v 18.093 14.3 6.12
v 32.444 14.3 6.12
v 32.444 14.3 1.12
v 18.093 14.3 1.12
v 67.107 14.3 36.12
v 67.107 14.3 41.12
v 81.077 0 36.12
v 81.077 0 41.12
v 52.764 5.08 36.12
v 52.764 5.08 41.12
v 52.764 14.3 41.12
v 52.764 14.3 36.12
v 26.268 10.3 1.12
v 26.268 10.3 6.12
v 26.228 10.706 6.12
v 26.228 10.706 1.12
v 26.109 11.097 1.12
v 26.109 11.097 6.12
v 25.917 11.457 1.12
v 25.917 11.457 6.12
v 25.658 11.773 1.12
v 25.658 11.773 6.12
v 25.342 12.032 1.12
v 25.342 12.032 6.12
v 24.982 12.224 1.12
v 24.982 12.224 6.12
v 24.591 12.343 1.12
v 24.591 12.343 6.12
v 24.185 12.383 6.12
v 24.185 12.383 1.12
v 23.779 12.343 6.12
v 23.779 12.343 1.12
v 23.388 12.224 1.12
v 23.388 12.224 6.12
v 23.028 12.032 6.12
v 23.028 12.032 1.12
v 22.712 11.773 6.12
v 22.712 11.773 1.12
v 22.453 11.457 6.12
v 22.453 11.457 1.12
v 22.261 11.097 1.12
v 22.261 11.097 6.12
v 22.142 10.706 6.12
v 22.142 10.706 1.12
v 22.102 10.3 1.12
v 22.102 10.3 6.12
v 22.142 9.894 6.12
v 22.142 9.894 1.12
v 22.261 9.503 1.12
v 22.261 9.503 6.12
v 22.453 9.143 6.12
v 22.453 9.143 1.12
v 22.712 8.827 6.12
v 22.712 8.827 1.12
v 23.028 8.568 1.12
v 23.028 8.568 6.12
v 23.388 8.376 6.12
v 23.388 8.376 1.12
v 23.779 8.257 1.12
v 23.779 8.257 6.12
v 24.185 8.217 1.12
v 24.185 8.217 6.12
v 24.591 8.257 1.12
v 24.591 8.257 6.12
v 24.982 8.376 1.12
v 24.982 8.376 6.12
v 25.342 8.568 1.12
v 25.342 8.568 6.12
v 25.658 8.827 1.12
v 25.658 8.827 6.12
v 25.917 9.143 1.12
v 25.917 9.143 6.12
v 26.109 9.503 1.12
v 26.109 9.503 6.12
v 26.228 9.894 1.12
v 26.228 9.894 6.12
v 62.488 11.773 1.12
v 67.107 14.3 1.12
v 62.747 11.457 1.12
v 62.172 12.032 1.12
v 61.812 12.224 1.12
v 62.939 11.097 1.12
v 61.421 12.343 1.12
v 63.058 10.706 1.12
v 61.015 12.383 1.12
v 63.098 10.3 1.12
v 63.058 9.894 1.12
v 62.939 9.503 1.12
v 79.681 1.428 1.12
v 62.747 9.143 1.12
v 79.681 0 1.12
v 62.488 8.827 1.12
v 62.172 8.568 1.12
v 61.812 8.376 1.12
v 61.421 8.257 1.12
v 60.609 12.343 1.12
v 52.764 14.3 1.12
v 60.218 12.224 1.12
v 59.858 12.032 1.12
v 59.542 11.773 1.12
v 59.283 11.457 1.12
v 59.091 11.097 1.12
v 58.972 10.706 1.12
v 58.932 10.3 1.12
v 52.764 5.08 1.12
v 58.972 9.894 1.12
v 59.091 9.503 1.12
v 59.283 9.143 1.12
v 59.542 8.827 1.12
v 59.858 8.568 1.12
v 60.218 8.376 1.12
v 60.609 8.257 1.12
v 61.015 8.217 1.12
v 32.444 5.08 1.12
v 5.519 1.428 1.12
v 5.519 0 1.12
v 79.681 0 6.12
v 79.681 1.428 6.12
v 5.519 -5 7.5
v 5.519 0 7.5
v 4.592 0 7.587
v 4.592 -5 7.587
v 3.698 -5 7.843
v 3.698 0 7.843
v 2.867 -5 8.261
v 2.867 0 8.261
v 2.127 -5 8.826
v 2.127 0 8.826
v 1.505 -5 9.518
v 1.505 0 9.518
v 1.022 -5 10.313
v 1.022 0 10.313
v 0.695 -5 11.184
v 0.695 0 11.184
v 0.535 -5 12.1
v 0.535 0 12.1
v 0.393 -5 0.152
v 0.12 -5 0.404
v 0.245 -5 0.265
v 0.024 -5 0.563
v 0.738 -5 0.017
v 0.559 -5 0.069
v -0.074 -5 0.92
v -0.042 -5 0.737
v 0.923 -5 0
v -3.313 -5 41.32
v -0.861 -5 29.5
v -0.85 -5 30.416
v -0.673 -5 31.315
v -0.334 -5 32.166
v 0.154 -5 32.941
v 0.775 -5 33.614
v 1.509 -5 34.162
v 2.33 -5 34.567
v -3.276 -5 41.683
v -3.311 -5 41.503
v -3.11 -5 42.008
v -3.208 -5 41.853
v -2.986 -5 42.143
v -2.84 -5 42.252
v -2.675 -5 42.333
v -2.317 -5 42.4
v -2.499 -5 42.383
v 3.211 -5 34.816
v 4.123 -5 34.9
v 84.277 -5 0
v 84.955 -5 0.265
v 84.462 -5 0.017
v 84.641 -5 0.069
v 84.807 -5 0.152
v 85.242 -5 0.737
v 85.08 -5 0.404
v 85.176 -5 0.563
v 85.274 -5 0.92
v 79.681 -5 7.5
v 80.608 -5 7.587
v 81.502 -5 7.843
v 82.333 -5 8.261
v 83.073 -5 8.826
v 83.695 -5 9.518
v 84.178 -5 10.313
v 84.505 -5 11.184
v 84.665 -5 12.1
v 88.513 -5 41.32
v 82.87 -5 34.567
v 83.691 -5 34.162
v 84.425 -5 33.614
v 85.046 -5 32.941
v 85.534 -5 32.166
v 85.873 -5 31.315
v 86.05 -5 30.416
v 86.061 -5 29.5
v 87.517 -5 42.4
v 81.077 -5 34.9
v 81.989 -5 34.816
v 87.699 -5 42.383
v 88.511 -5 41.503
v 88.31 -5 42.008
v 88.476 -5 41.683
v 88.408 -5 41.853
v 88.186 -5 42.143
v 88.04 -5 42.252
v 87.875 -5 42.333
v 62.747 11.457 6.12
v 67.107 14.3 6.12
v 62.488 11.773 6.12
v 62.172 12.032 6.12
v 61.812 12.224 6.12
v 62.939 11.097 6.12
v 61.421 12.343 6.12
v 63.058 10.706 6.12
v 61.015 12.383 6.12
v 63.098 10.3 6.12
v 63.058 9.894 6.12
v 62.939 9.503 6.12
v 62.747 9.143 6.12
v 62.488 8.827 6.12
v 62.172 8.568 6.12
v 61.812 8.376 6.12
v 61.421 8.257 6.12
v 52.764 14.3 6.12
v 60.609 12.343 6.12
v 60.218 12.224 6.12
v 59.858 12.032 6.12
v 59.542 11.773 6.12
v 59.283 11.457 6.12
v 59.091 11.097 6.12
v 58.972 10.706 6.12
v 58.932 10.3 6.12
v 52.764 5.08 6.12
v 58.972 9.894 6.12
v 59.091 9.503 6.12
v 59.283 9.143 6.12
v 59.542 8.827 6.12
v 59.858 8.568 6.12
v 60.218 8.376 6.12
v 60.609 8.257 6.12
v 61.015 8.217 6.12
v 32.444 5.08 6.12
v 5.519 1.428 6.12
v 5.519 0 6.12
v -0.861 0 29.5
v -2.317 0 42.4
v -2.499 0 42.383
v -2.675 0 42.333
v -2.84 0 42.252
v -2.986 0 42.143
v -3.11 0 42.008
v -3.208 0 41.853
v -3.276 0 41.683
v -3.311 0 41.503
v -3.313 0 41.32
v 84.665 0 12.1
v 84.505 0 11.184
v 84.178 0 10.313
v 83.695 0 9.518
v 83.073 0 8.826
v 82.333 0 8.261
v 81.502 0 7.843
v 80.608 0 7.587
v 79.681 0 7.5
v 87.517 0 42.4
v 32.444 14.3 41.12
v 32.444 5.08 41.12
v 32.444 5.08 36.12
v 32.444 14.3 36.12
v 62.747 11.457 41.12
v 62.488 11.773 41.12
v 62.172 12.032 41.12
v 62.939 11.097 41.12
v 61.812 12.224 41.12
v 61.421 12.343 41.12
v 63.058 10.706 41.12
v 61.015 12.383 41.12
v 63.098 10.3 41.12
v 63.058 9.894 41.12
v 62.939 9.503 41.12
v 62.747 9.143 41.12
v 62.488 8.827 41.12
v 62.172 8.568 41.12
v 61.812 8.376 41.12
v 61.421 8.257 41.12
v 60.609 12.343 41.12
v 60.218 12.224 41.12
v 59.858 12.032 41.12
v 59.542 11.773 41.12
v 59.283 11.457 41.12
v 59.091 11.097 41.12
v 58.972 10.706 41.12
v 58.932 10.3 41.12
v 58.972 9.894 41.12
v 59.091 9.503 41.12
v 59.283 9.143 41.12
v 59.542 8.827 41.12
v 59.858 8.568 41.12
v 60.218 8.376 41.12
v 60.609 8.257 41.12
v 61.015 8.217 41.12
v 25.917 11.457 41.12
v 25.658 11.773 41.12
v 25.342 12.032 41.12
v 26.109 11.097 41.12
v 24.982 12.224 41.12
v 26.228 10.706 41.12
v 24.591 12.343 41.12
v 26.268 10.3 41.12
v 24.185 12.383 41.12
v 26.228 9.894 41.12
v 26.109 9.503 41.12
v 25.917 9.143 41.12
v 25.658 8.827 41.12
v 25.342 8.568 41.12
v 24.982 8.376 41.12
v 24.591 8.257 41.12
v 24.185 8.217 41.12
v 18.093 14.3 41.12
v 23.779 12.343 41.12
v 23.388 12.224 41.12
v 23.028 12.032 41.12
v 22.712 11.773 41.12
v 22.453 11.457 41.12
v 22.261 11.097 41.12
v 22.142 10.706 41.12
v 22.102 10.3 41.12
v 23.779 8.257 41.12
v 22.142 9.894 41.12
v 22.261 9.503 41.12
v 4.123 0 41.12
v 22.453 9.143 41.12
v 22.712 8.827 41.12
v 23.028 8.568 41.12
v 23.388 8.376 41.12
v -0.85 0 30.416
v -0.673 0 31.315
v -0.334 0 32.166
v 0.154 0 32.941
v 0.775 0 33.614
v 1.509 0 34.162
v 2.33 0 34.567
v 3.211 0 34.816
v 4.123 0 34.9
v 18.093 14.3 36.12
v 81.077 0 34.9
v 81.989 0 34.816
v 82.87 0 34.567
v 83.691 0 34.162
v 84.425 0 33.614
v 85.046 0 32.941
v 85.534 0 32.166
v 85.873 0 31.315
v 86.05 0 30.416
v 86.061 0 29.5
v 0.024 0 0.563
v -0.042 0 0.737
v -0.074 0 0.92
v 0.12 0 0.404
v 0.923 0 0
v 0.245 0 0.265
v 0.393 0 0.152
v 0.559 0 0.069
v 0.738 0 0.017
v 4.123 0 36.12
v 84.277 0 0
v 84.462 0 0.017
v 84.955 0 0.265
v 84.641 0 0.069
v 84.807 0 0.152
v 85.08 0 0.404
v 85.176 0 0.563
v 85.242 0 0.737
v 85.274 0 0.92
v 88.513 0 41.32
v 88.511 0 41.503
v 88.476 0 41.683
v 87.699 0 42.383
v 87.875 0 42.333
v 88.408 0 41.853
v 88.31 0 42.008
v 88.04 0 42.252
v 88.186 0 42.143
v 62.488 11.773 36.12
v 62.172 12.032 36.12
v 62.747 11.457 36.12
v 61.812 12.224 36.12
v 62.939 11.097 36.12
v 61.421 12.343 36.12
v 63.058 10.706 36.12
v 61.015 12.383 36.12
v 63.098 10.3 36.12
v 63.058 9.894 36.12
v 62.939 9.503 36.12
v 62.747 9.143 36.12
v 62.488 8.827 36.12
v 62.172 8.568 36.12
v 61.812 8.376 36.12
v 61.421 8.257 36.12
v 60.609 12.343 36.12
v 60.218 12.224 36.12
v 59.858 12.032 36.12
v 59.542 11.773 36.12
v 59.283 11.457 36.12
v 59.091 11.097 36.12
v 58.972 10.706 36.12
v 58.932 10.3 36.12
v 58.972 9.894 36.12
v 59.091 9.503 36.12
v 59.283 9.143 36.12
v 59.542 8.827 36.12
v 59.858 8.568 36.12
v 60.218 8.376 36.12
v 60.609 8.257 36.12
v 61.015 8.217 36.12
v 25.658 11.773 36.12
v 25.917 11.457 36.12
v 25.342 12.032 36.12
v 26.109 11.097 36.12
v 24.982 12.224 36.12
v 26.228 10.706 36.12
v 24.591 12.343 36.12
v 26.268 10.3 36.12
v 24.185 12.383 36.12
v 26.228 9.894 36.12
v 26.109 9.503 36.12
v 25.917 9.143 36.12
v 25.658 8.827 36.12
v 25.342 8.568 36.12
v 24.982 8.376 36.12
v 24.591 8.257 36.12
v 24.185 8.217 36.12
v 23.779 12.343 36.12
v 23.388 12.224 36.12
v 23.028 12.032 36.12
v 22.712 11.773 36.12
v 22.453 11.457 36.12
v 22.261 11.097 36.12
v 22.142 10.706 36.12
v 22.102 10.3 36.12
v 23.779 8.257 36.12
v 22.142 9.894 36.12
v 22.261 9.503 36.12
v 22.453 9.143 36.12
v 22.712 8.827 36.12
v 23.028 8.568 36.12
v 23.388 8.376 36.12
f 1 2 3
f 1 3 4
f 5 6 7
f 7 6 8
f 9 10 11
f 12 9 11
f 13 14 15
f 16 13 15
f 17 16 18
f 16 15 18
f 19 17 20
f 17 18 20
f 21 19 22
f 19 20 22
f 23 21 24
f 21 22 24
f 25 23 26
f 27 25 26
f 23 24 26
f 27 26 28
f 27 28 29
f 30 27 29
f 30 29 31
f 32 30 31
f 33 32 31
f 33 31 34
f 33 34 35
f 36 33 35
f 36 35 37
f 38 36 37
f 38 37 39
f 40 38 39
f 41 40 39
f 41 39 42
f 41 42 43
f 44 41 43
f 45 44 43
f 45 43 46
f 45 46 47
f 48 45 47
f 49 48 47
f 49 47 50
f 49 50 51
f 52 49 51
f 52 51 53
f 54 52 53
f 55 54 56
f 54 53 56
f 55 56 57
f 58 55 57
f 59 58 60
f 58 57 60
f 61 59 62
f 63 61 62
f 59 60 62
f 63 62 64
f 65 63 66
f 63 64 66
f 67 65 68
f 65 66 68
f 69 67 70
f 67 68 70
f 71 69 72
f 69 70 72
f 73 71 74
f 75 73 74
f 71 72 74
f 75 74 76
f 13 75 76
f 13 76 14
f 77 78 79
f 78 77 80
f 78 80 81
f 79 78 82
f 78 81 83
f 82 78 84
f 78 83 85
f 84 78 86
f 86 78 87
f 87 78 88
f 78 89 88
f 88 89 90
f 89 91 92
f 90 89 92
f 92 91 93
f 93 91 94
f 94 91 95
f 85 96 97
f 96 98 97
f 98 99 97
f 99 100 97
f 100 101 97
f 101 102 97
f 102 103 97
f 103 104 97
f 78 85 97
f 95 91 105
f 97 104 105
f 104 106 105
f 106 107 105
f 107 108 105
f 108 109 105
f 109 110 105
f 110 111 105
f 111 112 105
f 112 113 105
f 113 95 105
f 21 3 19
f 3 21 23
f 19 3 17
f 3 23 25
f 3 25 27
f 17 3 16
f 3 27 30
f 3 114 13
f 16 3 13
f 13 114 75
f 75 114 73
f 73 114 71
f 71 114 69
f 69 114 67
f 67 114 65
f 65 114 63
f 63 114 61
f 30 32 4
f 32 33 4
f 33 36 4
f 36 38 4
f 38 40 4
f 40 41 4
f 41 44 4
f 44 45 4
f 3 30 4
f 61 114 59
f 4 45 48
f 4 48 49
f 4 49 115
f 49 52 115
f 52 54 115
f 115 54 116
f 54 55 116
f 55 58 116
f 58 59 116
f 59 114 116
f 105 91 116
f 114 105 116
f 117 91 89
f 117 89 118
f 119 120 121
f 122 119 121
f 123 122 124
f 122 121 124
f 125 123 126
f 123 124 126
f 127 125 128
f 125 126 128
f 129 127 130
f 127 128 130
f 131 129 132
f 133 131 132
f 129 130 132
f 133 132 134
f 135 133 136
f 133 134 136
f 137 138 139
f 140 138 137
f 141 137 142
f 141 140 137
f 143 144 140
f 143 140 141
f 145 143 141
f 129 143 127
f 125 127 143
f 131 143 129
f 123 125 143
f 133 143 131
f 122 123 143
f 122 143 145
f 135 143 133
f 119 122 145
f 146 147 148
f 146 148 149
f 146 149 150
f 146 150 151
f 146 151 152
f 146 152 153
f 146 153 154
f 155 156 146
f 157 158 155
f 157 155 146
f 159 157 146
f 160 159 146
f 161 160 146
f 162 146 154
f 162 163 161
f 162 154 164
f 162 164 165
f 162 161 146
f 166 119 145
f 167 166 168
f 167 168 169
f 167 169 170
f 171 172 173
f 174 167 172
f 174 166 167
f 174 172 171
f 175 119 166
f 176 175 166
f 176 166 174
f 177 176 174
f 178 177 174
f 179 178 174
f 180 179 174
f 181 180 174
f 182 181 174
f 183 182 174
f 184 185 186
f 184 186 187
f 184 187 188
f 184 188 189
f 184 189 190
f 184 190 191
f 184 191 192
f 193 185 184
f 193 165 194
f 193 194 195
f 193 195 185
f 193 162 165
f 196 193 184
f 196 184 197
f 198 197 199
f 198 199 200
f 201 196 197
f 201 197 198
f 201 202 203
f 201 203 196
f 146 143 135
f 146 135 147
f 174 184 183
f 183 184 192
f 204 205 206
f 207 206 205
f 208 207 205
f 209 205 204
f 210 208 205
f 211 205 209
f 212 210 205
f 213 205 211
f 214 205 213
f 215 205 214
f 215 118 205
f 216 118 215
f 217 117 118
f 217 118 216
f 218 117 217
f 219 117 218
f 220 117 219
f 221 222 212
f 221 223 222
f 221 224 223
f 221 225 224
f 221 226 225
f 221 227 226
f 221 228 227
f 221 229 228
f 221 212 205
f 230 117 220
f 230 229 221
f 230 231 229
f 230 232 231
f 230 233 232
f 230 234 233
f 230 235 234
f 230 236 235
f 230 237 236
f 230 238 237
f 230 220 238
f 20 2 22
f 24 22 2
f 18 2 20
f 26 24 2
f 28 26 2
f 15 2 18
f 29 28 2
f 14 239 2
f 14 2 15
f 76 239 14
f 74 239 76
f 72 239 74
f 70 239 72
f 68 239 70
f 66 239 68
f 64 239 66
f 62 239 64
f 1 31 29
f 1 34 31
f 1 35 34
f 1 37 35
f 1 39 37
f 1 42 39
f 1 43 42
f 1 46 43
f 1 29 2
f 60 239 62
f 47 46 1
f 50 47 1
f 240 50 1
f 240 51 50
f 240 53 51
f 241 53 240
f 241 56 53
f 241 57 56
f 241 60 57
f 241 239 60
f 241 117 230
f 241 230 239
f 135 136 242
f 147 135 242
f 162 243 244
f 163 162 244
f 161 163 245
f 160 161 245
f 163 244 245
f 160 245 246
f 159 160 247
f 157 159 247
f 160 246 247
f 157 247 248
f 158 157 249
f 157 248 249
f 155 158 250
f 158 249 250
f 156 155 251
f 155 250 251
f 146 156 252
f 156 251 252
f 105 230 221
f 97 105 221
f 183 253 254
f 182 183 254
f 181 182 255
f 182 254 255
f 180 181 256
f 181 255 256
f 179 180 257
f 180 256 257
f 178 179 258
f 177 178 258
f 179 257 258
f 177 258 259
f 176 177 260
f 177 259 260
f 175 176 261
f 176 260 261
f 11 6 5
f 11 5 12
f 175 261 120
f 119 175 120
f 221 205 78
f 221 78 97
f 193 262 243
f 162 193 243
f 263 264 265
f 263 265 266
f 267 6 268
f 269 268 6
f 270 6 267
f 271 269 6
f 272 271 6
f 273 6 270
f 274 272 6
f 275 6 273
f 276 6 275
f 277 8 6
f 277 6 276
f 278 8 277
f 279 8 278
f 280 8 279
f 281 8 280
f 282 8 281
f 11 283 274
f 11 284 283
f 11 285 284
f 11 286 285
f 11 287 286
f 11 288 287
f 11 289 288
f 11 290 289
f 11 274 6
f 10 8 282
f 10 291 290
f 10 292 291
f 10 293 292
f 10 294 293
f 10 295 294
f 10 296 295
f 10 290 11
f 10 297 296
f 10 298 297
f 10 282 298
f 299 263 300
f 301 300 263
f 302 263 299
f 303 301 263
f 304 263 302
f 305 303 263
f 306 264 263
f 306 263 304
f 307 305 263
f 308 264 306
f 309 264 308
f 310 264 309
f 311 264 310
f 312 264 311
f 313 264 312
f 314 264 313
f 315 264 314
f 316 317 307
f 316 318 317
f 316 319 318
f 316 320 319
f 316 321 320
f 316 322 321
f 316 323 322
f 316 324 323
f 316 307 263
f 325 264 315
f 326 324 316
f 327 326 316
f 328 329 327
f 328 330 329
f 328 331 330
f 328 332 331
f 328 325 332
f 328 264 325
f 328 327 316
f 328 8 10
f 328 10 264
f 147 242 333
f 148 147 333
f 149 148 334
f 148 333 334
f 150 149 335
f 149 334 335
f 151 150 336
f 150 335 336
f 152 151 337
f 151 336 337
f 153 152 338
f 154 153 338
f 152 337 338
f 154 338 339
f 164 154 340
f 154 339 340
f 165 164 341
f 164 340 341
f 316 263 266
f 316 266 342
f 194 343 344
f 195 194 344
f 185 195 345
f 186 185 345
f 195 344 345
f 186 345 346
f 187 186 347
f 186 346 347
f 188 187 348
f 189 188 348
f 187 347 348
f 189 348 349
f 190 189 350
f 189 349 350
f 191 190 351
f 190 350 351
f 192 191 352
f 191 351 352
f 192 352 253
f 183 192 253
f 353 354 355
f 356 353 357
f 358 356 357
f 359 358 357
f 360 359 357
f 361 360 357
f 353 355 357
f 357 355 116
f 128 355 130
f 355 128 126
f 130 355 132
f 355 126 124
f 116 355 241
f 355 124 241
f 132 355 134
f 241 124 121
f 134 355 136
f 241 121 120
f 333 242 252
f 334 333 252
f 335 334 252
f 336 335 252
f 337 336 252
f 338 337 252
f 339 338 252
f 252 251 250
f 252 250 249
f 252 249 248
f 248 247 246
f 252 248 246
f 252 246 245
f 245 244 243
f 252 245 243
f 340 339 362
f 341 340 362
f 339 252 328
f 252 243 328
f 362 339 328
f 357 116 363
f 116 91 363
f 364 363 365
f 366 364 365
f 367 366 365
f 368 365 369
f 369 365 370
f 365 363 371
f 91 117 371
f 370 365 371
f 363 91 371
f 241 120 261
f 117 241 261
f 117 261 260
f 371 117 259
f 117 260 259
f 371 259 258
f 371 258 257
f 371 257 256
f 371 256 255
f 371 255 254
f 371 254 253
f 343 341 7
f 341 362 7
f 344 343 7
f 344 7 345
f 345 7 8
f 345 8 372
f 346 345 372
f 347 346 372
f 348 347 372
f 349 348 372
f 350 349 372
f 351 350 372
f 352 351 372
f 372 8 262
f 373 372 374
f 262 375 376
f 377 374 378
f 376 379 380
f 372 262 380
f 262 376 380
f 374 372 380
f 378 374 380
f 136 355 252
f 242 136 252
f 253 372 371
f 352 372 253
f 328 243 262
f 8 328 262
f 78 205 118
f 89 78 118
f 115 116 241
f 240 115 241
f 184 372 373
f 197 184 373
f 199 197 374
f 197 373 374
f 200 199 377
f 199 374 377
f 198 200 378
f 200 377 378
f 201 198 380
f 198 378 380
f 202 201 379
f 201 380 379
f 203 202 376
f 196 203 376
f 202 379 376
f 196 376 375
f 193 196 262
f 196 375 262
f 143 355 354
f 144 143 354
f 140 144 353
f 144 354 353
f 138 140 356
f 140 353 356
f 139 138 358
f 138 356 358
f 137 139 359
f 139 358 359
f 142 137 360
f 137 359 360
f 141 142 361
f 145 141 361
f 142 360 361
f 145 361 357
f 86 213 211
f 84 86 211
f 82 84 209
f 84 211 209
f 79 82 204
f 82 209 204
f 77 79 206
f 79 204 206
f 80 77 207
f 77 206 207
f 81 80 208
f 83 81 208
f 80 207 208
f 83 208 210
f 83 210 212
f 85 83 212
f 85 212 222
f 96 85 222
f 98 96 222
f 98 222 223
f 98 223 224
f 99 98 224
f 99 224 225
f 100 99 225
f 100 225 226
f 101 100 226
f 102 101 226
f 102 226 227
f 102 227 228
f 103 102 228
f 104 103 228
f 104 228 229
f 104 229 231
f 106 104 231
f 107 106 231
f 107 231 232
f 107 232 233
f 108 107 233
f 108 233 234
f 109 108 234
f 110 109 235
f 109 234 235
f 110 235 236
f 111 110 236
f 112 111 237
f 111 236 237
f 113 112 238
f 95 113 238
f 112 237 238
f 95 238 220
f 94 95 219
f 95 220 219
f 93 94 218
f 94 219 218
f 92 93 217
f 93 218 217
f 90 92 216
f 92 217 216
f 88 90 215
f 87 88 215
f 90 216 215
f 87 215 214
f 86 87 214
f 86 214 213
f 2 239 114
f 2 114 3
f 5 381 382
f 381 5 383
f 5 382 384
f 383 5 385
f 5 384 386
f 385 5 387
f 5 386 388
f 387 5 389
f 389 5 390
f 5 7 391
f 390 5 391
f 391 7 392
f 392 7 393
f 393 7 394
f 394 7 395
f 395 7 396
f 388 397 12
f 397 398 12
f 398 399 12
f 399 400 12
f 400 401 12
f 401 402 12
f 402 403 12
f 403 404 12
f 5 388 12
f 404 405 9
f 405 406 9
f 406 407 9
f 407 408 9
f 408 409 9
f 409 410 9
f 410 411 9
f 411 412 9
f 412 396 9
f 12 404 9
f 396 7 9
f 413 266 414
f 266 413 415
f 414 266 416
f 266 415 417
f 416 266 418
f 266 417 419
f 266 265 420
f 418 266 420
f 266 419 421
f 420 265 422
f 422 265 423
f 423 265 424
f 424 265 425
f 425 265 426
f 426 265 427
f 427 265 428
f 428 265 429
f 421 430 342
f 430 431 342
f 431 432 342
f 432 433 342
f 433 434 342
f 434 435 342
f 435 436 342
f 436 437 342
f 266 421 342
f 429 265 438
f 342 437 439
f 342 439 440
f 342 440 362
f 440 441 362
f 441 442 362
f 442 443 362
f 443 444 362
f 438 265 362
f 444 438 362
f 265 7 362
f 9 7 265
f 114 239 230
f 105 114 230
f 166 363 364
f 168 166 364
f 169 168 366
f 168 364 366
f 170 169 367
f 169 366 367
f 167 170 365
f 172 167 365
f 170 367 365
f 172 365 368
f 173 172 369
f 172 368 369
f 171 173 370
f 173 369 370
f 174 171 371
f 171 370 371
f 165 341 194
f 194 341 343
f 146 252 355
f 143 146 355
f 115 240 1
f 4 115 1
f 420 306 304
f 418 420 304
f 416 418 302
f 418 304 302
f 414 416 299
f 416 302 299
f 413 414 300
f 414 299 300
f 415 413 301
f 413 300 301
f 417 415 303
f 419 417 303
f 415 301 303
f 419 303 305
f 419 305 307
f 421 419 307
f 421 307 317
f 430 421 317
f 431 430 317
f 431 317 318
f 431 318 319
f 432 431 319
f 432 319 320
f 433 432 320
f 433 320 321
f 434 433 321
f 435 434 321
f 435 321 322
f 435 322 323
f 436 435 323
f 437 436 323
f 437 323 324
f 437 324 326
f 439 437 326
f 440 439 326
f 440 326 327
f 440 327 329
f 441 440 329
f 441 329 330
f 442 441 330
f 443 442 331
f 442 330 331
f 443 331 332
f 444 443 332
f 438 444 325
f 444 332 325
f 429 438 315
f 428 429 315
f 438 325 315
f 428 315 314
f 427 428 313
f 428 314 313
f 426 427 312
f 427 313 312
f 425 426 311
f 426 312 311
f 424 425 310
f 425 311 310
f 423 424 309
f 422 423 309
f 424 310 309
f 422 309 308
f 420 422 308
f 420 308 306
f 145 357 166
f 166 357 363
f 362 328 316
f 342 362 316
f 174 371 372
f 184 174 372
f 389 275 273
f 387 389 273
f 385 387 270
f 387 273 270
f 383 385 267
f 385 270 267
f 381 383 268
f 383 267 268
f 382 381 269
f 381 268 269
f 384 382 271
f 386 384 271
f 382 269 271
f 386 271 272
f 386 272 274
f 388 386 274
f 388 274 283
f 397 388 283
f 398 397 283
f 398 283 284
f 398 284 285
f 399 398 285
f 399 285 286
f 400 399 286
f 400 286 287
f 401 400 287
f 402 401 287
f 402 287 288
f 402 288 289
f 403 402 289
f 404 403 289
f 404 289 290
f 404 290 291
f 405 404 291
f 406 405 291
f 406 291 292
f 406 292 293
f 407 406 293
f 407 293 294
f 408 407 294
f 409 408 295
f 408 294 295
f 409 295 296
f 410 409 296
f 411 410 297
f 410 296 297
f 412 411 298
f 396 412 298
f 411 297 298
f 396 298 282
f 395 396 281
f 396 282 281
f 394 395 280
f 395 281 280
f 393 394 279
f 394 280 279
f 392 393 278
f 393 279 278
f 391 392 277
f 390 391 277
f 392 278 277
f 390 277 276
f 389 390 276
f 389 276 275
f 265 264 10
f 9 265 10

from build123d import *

# Parameters (mm, degrees)
F1_DEPTH = 5
F2_W     = 76.953554
F2_H     = 5
F2_W_2   = 74.162988
F3_DEPTH = 14.3
F4_R     = 2.0828
F5_DEPTH = 41.121068
F6_W     = 20.32
F6_H     = 9.22
F7_DEPTH = 41.121068


with BuildPart() as f1:
    # F0 (on Front) → F1 (new body)
    with BuildSketch(Plane.XZ):
        with BuildLine():
            Line((-3.313402, 41.320068), (-0.073779, 0.920068))
            ThreePointArc((-0.073779, 0.920068), (0.244763, 0.265176), (0.923021, 0))
            Line((0.923021, 0), (84.276979, 0))
            ThreePointArc((84.276979, 0), (84.955237, 0.265176), (85.273779, 0.920068))
            Line((85.273779, 0.920068), (88.513402, 41.320068))
            ThreePointArc((88.513402, 41.320068), (88.251425, 42.078258), (87.516601, 42.4))
            Line((87.516601, 42.4), (-2.316601, 42.4))
            ThreePointArc((-2.316601, 42.4), (-3.051425, 42.078258), (-3.313402, 41.320068))
        make_face()
        with BuildLine():
            ThreePointArc((-0.860778, 29.500339), (0.449104, 33.29129), (4.123223, 34.9))
            Line((4.123223, 34.9), (81.076777, 34.9))
            ThreePointArc((81.076777, 34.9), (84.750896, 33.29129), (86.060778, 29.500339))
            Line((86.060778, 29.500339), (84.665495, 12.100339))
            ThreePointArc((84.665495, 12.100339), (83.072784, 8.825881), (79.681494, 7.5))
            Line((79.681494, 7.5), (5.518506, 7.5))
            ThreePointArc((5.518506, 7.5), (2.127216, 8.825881), (0.534505, 12.100339))
            Line((0.534505, 12.100339), (-0.860778, 29.500339))
        make_face(mode=Mode.SUBTRACT)
    extrude(amount=F1_DEPTH)

    # F2 (on face) → F3 (join)
    with BuildSketch(Plane(origin=(0, 0, 0), x_dir=(-1, 0, 0), z_dir=(0, 1, 0))):
        with Locations((-42.6, 38.620068)):
            Rectangle(F2_W, F2_H)
        with Locations((-42.6, 3.620068)):
            Rectangle(F2_W_2, F2_H)
    extrude(amount=F3_DEPTH)

    # F4 (on face) → F5 (cut, through all)
    with BuildSketch(Plane.XY.offset(41.120068)):
        with Locations((24.185, 10.3)):
            Circle(F4_R)
        with Locations((61.015, 10.3)):
            Circle(F4_R)
    extrude(amount=-F5_DEPTH, mode=Mode.SUBTRACT)

    # F6 (on face) → F7 (cut, through all)
    with BuildSketch(Plane.XY.offset(41.120068)):
        Polygon((4.123223, 14.3), (4.123223, 0), (18.093223, 14.3), align=None)
        with Locations((42.604223, 9.69)):
            Rectangle(F6_W, F6_H)
        Polygon((81.076777, 14.3), (67.106777, 14.3), (81.076777, 0), align=None)
    extrude(amount=-F7_DEPTH, mode=Mode.SUBTRACT)


solid = f1.part
